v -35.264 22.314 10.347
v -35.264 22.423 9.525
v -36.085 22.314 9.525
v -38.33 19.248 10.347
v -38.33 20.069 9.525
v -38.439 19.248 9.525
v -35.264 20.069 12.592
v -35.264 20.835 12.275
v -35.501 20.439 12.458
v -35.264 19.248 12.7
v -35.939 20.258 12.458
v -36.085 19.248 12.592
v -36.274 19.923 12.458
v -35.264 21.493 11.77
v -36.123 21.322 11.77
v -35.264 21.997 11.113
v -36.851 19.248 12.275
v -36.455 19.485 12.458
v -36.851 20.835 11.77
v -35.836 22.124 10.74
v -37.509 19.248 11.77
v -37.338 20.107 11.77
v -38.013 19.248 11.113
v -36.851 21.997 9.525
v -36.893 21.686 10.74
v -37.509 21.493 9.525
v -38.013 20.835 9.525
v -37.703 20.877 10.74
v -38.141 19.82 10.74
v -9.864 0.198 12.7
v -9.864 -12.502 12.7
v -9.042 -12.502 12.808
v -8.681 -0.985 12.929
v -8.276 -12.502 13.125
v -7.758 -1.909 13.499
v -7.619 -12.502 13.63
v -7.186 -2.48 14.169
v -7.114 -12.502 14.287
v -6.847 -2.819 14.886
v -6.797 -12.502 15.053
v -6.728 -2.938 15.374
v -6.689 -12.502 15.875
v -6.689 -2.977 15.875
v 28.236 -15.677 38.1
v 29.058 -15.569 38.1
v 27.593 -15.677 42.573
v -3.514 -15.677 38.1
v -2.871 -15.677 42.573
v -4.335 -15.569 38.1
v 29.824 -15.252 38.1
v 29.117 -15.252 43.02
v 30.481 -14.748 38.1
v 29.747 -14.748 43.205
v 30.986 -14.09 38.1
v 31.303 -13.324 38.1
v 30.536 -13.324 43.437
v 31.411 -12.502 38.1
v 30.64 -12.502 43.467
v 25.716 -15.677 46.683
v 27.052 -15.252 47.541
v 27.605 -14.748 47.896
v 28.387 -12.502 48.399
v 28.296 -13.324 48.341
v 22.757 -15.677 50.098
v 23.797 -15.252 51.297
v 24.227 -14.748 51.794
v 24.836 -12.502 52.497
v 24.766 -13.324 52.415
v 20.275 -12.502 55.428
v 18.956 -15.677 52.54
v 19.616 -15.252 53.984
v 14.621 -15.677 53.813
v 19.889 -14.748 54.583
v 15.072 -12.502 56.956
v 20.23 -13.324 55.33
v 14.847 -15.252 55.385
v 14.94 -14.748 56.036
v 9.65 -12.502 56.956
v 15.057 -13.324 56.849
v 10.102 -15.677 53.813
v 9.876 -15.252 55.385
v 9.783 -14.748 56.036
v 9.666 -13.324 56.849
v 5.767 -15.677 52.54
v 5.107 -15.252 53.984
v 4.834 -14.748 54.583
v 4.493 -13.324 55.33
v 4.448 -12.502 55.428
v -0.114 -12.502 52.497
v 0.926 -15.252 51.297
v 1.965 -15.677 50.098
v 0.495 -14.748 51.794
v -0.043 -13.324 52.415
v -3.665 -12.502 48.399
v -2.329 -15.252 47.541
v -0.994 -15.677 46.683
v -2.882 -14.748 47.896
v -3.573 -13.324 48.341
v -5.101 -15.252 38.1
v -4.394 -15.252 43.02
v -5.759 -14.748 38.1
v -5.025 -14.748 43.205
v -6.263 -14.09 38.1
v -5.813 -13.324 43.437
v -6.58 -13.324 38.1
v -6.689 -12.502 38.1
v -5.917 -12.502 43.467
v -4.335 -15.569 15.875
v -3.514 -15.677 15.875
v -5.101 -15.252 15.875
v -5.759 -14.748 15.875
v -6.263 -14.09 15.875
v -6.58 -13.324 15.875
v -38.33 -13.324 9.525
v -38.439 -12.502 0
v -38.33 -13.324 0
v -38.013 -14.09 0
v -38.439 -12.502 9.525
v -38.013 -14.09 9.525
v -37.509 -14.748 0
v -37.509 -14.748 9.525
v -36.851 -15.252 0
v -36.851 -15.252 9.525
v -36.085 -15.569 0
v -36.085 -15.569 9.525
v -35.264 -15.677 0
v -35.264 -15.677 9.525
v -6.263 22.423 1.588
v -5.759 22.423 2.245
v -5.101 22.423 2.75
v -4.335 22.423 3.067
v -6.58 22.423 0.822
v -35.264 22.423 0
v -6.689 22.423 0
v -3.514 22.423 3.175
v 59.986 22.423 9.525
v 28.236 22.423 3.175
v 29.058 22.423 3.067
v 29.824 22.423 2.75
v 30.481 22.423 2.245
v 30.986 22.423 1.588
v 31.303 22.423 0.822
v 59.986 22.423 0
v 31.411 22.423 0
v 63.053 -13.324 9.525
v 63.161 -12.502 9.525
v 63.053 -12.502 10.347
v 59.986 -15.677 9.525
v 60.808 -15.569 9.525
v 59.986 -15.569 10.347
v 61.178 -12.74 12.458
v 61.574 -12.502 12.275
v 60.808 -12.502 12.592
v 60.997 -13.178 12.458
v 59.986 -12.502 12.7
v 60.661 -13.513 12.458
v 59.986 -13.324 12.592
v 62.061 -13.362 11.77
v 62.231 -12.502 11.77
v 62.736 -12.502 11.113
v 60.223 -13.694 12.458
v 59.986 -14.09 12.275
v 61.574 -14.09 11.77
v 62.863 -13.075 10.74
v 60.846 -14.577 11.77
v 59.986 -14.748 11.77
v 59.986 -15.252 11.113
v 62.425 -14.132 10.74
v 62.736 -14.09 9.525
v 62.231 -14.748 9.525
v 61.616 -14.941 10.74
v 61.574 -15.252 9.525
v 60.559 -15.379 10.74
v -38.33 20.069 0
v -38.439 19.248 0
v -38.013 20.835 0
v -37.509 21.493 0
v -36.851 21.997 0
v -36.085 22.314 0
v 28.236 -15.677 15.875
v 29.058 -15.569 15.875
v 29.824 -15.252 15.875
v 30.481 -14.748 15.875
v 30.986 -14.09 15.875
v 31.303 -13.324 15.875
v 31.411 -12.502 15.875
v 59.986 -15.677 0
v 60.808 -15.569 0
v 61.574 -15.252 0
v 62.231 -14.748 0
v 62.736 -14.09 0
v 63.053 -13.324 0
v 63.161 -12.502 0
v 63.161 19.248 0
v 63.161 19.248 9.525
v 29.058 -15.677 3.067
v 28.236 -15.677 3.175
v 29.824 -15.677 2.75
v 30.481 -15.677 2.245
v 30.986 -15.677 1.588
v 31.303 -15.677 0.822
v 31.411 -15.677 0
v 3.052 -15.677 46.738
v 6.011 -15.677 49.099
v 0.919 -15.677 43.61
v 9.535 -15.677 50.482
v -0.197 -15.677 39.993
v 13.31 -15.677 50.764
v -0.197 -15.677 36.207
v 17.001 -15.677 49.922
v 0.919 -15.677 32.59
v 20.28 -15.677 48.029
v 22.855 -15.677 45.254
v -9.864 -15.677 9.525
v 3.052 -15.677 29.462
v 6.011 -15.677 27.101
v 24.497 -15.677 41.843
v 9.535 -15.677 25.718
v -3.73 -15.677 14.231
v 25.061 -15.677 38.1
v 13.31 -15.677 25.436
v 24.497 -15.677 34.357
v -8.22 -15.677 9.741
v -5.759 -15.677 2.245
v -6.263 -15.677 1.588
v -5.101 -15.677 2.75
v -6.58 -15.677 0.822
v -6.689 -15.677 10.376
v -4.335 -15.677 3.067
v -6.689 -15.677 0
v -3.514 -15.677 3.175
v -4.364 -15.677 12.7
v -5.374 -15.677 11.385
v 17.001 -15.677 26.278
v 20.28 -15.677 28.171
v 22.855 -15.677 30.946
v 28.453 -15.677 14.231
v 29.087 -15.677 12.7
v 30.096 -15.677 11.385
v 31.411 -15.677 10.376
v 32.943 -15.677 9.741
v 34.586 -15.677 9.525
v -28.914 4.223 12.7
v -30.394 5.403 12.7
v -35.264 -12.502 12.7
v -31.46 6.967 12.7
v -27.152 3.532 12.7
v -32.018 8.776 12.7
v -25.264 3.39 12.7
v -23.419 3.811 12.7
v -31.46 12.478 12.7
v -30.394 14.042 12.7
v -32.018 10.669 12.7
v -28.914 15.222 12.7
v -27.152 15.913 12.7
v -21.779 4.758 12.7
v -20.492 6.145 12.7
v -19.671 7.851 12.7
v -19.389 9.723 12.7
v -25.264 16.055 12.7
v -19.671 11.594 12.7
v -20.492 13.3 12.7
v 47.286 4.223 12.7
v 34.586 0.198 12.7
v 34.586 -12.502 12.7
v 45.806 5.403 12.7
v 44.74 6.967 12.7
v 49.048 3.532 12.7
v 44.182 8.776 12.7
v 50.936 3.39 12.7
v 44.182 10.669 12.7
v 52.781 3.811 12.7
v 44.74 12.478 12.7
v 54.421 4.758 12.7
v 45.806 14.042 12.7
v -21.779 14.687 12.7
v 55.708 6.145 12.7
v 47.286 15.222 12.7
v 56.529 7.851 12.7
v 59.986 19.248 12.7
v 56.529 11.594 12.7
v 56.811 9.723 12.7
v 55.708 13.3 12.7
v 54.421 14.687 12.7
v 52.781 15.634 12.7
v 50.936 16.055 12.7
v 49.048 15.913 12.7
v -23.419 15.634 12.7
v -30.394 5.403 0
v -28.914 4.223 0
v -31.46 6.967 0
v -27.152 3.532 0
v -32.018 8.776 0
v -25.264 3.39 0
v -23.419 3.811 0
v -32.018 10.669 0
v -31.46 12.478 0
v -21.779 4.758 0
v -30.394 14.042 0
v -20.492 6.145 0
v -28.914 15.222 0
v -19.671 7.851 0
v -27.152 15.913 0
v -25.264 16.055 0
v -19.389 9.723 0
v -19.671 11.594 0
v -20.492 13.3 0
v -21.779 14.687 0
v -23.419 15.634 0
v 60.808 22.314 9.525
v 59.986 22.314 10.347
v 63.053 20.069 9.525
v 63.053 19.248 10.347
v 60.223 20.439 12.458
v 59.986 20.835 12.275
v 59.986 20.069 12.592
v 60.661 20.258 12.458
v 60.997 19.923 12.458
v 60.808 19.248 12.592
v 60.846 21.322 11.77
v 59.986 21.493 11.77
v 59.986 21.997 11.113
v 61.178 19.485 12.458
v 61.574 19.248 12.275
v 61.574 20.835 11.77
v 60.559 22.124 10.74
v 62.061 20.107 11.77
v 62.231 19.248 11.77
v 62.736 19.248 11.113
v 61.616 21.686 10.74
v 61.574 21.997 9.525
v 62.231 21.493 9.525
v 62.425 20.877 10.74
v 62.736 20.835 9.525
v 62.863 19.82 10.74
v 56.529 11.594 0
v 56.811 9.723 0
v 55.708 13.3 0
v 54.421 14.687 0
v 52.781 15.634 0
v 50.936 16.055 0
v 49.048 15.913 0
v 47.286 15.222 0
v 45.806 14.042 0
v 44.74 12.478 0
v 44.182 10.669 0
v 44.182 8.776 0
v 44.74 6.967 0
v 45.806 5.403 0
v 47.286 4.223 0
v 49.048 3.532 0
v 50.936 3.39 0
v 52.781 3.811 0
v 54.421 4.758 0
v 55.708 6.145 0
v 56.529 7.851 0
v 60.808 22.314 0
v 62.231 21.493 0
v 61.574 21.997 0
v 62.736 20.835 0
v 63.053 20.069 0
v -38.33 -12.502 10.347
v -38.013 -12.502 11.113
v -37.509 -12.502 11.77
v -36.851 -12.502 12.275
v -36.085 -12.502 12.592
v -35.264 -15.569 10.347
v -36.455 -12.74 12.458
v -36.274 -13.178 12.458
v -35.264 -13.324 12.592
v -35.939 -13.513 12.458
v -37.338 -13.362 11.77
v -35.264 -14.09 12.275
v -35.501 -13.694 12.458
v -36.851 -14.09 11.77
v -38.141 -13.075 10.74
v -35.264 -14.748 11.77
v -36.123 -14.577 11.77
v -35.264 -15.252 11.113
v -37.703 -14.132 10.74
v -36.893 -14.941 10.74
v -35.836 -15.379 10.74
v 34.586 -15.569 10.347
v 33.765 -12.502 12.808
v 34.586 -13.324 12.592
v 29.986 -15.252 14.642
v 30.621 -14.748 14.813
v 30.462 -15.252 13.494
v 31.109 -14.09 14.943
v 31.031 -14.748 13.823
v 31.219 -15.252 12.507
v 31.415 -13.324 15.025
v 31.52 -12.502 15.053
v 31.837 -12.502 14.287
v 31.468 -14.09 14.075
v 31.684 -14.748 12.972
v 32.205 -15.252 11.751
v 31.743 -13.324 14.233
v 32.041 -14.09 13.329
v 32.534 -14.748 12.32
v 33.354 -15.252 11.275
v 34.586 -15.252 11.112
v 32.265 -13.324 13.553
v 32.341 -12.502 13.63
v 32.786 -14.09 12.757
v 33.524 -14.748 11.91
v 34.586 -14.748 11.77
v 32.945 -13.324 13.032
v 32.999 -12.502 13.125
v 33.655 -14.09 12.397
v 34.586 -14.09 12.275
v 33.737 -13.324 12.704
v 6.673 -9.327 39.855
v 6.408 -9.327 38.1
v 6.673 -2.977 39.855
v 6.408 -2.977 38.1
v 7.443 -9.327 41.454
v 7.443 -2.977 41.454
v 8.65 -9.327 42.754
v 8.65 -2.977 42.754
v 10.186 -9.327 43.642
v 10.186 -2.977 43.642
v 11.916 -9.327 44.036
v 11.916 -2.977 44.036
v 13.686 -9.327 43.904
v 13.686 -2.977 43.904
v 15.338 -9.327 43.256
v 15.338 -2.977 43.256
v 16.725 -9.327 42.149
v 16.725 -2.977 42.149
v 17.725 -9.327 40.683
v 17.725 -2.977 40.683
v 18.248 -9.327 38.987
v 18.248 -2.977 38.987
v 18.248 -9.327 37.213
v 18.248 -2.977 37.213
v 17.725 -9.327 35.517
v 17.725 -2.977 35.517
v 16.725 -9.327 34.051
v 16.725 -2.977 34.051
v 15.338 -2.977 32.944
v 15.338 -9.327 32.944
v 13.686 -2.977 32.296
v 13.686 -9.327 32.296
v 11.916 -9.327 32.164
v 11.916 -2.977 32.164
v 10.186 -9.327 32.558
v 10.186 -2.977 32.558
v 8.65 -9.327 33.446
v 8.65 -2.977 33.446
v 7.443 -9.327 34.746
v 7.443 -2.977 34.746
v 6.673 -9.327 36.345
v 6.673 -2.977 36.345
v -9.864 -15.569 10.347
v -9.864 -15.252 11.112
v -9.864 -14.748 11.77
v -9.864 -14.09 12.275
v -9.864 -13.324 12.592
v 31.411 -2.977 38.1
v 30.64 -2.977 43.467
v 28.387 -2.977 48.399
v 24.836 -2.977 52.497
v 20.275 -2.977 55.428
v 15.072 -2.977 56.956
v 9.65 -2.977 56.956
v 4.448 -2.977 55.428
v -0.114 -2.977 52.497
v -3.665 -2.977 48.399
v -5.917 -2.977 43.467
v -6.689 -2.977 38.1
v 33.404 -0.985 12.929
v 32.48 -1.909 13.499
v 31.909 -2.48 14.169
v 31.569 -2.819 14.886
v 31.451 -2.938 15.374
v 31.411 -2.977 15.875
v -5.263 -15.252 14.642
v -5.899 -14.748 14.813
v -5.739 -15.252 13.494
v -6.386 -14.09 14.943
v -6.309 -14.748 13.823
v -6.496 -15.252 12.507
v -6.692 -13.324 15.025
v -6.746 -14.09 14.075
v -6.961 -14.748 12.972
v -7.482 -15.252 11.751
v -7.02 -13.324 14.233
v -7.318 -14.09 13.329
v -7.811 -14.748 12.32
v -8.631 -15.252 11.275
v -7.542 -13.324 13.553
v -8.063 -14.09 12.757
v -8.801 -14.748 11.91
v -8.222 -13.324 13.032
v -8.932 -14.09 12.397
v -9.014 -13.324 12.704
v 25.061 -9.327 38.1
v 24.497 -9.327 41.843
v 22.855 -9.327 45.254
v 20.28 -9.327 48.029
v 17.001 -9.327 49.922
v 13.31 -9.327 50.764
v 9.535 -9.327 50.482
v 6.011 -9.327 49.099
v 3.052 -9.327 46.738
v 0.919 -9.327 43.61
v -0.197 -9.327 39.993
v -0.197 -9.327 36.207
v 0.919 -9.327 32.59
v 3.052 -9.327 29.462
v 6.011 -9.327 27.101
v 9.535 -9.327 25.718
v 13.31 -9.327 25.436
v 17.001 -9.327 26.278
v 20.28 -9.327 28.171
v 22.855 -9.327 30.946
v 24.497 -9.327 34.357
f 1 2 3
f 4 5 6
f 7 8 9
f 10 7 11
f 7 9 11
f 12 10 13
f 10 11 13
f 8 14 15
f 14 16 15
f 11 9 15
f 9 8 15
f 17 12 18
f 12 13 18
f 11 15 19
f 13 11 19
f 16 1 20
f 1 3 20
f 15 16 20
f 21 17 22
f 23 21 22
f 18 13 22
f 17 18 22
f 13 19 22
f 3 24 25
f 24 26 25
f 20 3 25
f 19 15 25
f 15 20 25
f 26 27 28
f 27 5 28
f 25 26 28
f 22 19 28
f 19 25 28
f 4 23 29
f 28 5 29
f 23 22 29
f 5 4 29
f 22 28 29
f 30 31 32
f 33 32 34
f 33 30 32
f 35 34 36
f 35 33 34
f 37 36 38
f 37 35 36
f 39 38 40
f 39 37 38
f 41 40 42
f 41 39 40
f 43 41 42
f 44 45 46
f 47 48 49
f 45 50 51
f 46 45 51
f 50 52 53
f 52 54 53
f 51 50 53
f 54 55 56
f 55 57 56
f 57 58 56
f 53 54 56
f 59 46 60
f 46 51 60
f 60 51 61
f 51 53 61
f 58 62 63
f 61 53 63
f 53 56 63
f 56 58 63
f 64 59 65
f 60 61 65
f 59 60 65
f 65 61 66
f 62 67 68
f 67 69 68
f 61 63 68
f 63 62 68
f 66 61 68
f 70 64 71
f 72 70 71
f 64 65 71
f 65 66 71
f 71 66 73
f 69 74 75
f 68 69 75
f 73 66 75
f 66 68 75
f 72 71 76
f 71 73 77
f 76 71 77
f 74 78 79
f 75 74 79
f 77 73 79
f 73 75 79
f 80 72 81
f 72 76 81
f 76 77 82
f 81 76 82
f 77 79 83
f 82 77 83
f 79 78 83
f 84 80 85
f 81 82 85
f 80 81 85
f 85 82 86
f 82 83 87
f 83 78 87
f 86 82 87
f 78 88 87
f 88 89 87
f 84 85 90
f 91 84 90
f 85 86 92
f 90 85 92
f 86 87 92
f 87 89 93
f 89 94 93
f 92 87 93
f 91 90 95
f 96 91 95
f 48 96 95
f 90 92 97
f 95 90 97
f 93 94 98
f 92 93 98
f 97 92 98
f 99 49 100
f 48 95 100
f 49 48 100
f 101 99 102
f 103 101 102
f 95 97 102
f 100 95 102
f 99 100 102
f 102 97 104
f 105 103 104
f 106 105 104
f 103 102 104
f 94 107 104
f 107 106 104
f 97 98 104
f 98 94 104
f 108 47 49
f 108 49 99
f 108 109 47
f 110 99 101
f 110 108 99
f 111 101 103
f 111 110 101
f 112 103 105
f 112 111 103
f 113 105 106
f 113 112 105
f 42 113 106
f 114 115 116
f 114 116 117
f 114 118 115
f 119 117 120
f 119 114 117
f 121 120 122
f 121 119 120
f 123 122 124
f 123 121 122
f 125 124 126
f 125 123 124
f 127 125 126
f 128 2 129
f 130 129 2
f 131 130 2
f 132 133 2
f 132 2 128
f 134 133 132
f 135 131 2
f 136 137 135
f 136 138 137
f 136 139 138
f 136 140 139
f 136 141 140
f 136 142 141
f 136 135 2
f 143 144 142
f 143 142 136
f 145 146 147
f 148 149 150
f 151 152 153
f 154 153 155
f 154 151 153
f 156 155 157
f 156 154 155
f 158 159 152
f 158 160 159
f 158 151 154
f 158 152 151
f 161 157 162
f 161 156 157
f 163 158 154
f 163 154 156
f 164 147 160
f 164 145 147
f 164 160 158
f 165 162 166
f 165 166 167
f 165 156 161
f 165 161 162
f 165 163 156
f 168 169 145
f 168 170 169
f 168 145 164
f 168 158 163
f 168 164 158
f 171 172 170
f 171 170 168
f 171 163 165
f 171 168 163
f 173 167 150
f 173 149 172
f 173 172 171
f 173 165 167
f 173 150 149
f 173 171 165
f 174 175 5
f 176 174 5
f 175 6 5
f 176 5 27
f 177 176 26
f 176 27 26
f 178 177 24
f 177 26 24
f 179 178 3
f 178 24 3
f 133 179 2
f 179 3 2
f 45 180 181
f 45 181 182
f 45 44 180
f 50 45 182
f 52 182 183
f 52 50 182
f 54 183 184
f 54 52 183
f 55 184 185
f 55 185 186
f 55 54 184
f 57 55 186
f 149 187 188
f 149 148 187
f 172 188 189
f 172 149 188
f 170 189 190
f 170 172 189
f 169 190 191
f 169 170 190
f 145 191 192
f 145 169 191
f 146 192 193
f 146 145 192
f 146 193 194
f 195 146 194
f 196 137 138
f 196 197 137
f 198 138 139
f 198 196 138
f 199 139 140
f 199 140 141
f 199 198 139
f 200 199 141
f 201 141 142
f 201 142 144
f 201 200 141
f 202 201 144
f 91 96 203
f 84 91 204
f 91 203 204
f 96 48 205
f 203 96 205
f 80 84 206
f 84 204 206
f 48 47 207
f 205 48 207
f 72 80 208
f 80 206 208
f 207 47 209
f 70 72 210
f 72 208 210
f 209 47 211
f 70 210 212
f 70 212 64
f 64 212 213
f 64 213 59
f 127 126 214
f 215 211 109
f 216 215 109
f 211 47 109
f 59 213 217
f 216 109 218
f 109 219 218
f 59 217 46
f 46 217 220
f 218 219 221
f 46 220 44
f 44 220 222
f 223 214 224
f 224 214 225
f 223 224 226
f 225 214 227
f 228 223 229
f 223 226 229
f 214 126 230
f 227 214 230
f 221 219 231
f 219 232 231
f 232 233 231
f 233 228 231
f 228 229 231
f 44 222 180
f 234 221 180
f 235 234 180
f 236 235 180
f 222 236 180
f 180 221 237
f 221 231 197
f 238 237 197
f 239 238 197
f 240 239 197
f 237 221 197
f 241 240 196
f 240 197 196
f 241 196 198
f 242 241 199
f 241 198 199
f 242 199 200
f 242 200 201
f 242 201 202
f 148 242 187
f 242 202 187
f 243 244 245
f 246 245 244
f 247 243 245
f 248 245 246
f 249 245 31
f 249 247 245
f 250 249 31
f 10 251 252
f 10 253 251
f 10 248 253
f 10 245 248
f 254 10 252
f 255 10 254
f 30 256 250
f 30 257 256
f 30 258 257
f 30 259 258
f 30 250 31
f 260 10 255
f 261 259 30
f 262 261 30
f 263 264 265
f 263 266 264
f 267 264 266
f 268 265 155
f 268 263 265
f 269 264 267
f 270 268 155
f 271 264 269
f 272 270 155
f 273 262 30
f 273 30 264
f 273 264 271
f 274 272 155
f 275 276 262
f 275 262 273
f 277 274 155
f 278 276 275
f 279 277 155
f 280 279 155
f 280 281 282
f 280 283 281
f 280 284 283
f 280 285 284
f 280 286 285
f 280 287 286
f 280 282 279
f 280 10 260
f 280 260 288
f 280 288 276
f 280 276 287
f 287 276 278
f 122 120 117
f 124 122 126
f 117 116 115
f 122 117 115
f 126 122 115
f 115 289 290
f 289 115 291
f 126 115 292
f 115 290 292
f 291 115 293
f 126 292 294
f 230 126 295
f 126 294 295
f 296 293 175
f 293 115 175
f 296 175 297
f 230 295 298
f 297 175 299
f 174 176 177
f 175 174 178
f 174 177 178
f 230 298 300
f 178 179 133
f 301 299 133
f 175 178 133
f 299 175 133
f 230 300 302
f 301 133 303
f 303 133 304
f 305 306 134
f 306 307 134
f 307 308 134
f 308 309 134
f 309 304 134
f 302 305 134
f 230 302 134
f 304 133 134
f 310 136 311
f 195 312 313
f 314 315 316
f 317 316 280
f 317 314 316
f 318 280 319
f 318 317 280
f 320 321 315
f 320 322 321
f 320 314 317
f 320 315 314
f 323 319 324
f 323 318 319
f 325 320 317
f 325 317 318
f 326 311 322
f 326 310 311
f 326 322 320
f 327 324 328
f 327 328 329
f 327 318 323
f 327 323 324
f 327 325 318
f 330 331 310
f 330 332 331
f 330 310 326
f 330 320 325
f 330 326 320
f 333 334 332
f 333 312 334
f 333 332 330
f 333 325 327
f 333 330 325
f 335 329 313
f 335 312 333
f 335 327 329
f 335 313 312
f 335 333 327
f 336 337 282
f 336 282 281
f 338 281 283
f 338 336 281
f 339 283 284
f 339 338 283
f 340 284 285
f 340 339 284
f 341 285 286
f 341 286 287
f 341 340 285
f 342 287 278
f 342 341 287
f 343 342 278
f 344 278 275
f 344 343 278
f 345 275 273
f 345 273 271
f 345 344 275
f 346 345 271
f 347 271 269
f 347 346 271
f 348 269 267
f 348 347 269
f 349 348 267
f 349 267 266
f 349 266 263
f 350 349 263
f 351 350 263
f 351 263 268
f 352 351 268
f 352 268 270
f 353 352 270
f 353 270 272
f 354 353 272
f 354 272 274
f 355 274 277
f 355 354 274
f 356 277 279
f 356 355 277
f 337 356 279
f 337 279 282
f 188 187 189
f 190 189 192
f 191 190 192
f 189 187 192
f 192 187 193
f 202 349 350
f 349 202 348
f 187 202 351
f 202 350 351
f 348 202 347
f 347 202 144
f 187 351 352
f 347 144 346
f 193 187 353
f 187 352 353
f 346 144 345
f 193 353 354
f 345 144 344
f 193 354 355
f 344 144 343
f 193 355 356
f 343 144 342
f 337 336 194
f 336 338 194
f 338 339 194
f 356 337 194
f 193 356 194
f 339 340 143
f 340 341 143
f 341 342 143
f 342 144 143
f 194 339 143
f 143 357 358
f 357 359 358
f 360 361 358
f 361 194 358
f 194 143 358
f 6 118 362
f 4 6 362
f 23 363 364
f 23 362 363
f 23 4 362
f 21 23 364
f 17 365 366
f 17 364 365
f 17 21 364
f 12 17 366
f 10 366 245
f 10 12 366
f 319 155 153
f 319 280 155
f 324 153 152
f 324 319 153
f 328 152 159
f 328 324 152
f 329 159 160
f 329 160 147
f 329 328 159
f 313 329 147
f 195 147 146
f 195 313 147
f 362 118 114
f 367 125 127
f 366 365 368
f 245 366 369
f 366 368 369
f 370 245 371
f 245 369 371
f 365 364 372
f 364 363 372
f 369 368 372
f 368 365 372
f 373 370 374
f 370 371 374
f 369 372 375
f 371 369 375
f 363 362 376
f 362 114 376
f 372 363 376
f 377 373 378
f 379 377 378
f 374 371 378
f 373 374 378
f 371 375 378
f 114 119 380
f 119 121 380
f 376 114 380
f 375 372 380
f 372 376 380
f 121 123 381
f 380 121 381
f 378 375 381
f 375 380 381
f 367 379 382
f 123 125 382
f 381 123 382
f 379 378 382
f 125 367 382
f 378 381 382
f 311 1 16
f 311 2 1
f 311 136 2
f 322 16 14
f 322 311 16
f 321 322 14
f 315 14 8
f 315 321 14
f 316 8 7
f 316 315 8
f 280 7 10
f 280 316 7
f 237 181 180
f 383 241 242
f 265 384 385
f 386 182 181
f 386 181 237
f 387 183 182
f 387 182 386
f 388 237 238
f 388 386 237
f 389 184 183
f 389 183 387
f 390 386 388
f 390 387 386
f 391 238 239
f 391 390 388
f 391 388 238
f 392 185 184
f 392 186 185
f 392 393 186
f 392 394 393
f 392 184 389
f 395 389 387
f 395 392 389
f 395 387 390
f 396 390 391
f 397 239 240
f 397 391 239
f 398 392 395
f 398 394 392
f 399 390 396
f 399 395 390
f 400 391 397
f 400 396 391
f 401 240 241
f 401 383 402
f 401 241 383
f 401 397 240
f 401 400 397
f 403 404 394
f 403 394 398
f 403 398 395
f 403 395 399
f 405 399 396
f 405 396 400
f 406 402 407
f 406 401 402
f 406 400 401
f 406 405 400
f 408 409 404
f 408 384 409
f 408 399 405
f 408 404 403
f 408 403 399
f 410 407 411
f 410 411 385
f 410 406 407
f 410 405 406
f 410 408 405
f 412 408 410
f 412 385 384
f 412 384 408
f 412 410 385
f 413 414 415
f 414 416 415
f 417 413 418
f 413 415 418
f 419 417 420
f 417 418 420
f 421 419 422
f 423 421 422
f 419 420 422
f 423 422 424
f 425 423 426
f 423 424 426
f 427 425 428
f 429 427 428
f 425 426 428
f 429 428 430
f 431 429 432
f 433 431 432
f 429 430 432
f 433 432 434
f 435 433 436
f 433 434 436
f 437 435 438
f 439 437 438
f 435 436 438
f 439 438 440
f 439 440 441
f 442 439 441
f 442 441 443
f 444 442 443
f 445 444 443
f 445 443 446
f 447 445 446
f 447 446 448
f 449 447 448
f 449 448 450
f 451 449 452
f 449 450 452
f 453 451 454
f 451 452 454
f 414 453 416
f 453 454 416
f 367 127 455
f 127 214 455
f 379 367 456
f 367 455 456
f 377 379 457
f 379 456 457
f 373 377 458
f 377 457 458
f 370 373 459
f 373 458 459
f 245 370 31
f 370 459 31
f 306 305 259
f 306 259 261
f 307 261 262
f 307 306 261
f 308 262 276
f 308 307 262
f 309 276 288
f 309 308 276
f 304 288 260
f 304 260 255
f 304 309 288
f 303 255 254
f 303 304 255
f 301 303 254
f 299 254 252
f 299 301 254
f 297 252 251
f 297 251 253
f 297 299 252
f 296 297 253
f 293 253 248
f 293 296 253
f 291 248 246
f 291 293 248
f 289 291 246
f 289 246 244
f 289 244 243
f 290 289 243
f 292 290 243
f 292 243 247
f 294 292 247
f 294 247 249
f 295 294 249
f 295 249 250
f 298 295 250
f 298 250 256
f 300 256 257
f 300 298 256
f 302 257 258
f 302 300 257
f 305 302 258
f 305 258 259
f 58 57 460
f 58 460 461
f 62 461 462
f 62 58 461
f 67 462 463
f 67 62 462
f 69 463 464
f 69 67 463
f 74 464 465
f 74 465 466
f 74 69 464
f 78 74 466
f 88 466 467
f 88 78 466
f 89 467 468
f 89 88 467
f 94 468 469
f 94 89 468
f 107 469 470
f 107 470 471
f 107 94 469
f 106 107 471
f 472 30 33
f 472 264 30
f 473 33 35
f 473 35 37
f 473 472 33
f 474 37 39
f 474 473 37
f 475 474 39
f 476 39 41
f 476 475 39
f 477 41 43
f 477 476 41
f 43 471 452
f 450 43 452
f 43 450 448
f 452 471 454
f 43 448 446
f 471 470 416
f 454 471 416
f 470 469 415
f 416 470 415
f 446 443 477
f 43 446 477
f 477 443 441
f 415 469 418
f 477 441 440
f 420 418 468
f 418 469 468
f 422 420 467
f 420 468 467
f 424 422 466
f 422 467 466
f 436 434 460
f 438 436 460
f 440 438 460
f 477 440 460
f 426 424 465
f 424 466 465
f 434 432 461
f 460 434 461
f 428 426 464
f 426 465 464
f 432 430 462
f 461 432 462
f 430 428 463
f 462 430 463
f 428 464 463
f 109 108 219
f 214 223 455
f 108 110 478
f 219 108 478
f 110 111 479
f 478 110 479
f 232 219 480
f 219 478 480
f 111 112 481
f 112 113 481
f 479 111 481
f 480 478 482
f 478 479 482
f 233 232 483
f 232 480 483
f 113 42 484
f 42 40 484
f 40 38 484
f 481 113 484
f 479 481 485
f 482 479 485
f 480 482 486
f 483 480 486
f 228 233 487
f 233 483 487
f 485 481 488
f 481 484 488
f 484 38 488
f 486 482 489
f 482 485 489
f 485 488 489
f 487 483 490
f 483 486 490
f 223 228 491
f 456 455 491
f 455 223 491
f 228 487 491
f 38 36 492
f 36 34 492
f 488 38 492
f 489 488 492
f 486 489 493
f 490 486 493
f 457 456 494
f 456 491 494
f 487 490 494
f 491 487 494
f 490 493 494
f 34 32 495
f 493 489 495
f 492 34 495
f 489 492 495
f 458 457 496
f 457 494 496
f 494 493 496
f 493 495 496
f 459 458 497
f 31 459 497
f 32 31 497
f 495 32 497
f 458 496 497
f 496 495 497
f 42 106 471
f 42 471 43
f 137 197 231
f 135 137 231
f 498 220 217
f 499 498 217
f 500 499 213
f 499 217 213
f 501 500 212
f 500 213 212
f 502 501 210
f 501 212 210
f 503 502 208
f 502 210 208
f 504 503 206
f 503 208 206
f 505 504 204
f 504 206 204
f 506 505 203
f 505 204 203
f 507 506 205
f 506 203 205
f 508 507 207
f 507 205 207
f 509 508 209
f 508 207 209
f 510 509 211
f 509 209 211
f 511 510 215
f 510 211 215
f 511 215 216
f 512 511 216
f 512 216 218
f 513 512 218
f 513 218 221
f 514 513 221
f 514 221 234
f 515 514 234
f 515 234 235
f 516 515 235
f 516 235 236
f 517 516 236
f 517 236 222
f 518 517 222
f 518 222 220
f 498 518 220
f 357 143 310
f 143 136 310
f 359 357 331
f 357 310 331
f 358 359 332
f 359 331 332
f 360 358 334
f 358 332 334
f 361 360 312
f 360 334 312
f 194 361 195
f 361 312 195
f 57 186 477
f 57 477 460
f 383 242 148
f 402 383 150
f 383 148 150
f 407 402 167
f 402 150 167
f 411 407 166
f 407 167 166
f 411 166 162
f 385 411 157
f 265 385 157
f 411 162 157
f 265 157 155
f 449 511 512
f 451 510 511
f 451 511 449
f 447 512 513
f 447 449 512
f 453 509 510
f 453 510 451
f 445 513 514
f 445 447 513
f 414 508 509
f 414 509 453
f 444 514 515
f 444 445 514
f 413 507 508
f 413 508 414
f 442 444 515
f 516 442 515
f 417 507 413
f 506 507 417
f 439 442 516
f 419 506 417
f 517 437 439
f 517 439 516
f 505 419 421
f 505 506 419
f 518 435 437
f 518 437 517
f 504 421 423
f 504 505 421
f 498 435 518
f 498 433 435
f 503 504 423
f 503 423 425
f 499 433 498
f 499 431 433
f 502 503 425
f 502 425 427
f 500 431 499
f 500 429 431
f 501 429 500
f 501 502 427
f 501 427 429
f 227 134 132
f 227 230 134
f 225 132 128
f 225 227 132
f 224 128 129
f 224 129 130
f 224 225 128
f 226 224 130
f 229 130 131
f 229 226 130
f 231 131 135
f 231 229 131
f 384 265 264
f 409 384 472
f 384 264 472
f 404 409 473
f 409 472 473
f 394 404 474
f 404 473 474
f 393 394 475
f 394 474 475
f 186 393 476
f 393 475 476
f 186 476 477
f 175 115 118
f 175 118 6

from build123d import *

# Parameters (mm, degrees)
F0_W           = 101.6
F0_H           = 38.1
F0_R           = 6.35
F1_DEPTH       = 12.7
F3_DEPTH       = 12.7
F4_D           = 11.90625
F4_CBORE_D     = 25.4
F4_CBORE_DEPTH = 6.35
F5_W           = 38.1
F5_H           = 3.175
F6_DEPTH       = 38.101
F9_R           = 3.175
F9_R_2         = 3.17499


# Not quite as in the source:
# - a fillet or chamfer is up to 0.001 mm smaller than in the source, because OpenCascade refuses the exact size
# - a feature of the source that left no trace in its solid (it failed there, or was rolled back) is left out
# - a length typed as a fraction of an inch, garbled in the dataset ("3 / 203.2 mm" for 3/8 in), is restored


with BuildPart() as f1:
    # F0 (on Top) → F1 (new body)
    with BuildSketch(Plane.XY):
        with Locations((12.3613710271, 3.3725141548)):
            Rectangle(F0_W, F0_H)
        with Locations((-25.7386289729, 9.7225141548)):
            Circle(F0_R, mode=Mode.SUBTRACT)
        with Locations((50.4613710271, 9.7225141548)):
            Circle(F0_R, mode=Mode.SUBTRACT)
    extrude(amount=F1_DEPTH)

    # F2 (on face) → F3 (join)
    with BuildSketch(Plane.XZ.offset(15.6774858452)):
        with BuildLine():
            Line((-6.6886289729, 38.1), (-6.6886289729, 12.7))
            Line((-6.6886289729, 12.7), (31.4113710271, 12.7))
            Line((31.4113710271, 12.7), (31.4113710271, 38.1))
            ThreePointArc((31.4113710271, 38.1), (12.3613710271, 57.15), (-6.6886289729, 38.1))
        make_face()
    extrude(amount=-F3_DEPTH)

    # F4 (through all)
    with Locations(Plane.XZ.offset(15.6774858452)):
        with Locations((12.3613710271, 38.1)):
            CounterBoreHole(F4_D / 2, F4_CBORE_D / 2, F4_CBORE_DEPTH)

    # F5 (on face) → F6 (cut, through all)
    with BuildSketch(Plane(origin=(0, 22.4225141548, 0), x_dir=(-1, 0, 0), z_dir=(0, 1, 0))):
        with Locations((-12.3613710271, 1.5875)):
            Rectangle(F5_W, F5_H)
    extrude(amount=-F6_DEPTH, mode=Mode.SUBTRACT)

    # F8: union 

    # F9 (call 1 of 3: OpenCascade refuses the feature's edges together)
    f9_edges = [f1.edges().sort_by_distance(p)[0] for p in [
        (63.161371, -15.677486, 6.35),
        (63.161371, 22.422514, 6.35),
        (-38.438629, -15.677486, 6.35),
        (-38.438629, 22.422514, 6.35),
        (12.361371, 22.422514, 12.7),
        (63.161371, 3.372514, 12.7),
        (-38.438629, 3.372514, 12.7),
        (47.286371, -15.677486, 12.7),
        (-22.563629, -15.677486, 12.7),
        (12.361371, -2.977486, 12.7),
        (31.411371, -9.327486, 12.7),
        (-6.688629, -9.327486, 12.7),
        (31.411371, -15.677486, 25.4),
        (12.361371, -15.677486, 57.15),
        (-6.688629, -15.677486, 25.4),
    ]]
    fillet(f9_edges, radius=F9_R)

    # F9#2 (call 2 of 3) (radius 3.175 in the source; OpenCascade refuses exactly that, so slightly less here)
    f9_2_edges = [f1.edges().sort_by_distance(p)[0] for p in [
        (-6.688629, 3.372514, 3.175),
    ]]
    fillet(f9_2_edges, radius=F9_R_2)

    # F9#3 (call 3 of 3) (radius 3.175 in the source; OpenCascade refuses exactly that, so slightly less here)
    f9_3_edges = [f1.edges().sort_by_distance(p)[0] for p in [
        (31.411371, 3.372514, 3.175),
    ]]
    fillet(f9_3_edges, radius=F9_R_2)


solid = f1.part
